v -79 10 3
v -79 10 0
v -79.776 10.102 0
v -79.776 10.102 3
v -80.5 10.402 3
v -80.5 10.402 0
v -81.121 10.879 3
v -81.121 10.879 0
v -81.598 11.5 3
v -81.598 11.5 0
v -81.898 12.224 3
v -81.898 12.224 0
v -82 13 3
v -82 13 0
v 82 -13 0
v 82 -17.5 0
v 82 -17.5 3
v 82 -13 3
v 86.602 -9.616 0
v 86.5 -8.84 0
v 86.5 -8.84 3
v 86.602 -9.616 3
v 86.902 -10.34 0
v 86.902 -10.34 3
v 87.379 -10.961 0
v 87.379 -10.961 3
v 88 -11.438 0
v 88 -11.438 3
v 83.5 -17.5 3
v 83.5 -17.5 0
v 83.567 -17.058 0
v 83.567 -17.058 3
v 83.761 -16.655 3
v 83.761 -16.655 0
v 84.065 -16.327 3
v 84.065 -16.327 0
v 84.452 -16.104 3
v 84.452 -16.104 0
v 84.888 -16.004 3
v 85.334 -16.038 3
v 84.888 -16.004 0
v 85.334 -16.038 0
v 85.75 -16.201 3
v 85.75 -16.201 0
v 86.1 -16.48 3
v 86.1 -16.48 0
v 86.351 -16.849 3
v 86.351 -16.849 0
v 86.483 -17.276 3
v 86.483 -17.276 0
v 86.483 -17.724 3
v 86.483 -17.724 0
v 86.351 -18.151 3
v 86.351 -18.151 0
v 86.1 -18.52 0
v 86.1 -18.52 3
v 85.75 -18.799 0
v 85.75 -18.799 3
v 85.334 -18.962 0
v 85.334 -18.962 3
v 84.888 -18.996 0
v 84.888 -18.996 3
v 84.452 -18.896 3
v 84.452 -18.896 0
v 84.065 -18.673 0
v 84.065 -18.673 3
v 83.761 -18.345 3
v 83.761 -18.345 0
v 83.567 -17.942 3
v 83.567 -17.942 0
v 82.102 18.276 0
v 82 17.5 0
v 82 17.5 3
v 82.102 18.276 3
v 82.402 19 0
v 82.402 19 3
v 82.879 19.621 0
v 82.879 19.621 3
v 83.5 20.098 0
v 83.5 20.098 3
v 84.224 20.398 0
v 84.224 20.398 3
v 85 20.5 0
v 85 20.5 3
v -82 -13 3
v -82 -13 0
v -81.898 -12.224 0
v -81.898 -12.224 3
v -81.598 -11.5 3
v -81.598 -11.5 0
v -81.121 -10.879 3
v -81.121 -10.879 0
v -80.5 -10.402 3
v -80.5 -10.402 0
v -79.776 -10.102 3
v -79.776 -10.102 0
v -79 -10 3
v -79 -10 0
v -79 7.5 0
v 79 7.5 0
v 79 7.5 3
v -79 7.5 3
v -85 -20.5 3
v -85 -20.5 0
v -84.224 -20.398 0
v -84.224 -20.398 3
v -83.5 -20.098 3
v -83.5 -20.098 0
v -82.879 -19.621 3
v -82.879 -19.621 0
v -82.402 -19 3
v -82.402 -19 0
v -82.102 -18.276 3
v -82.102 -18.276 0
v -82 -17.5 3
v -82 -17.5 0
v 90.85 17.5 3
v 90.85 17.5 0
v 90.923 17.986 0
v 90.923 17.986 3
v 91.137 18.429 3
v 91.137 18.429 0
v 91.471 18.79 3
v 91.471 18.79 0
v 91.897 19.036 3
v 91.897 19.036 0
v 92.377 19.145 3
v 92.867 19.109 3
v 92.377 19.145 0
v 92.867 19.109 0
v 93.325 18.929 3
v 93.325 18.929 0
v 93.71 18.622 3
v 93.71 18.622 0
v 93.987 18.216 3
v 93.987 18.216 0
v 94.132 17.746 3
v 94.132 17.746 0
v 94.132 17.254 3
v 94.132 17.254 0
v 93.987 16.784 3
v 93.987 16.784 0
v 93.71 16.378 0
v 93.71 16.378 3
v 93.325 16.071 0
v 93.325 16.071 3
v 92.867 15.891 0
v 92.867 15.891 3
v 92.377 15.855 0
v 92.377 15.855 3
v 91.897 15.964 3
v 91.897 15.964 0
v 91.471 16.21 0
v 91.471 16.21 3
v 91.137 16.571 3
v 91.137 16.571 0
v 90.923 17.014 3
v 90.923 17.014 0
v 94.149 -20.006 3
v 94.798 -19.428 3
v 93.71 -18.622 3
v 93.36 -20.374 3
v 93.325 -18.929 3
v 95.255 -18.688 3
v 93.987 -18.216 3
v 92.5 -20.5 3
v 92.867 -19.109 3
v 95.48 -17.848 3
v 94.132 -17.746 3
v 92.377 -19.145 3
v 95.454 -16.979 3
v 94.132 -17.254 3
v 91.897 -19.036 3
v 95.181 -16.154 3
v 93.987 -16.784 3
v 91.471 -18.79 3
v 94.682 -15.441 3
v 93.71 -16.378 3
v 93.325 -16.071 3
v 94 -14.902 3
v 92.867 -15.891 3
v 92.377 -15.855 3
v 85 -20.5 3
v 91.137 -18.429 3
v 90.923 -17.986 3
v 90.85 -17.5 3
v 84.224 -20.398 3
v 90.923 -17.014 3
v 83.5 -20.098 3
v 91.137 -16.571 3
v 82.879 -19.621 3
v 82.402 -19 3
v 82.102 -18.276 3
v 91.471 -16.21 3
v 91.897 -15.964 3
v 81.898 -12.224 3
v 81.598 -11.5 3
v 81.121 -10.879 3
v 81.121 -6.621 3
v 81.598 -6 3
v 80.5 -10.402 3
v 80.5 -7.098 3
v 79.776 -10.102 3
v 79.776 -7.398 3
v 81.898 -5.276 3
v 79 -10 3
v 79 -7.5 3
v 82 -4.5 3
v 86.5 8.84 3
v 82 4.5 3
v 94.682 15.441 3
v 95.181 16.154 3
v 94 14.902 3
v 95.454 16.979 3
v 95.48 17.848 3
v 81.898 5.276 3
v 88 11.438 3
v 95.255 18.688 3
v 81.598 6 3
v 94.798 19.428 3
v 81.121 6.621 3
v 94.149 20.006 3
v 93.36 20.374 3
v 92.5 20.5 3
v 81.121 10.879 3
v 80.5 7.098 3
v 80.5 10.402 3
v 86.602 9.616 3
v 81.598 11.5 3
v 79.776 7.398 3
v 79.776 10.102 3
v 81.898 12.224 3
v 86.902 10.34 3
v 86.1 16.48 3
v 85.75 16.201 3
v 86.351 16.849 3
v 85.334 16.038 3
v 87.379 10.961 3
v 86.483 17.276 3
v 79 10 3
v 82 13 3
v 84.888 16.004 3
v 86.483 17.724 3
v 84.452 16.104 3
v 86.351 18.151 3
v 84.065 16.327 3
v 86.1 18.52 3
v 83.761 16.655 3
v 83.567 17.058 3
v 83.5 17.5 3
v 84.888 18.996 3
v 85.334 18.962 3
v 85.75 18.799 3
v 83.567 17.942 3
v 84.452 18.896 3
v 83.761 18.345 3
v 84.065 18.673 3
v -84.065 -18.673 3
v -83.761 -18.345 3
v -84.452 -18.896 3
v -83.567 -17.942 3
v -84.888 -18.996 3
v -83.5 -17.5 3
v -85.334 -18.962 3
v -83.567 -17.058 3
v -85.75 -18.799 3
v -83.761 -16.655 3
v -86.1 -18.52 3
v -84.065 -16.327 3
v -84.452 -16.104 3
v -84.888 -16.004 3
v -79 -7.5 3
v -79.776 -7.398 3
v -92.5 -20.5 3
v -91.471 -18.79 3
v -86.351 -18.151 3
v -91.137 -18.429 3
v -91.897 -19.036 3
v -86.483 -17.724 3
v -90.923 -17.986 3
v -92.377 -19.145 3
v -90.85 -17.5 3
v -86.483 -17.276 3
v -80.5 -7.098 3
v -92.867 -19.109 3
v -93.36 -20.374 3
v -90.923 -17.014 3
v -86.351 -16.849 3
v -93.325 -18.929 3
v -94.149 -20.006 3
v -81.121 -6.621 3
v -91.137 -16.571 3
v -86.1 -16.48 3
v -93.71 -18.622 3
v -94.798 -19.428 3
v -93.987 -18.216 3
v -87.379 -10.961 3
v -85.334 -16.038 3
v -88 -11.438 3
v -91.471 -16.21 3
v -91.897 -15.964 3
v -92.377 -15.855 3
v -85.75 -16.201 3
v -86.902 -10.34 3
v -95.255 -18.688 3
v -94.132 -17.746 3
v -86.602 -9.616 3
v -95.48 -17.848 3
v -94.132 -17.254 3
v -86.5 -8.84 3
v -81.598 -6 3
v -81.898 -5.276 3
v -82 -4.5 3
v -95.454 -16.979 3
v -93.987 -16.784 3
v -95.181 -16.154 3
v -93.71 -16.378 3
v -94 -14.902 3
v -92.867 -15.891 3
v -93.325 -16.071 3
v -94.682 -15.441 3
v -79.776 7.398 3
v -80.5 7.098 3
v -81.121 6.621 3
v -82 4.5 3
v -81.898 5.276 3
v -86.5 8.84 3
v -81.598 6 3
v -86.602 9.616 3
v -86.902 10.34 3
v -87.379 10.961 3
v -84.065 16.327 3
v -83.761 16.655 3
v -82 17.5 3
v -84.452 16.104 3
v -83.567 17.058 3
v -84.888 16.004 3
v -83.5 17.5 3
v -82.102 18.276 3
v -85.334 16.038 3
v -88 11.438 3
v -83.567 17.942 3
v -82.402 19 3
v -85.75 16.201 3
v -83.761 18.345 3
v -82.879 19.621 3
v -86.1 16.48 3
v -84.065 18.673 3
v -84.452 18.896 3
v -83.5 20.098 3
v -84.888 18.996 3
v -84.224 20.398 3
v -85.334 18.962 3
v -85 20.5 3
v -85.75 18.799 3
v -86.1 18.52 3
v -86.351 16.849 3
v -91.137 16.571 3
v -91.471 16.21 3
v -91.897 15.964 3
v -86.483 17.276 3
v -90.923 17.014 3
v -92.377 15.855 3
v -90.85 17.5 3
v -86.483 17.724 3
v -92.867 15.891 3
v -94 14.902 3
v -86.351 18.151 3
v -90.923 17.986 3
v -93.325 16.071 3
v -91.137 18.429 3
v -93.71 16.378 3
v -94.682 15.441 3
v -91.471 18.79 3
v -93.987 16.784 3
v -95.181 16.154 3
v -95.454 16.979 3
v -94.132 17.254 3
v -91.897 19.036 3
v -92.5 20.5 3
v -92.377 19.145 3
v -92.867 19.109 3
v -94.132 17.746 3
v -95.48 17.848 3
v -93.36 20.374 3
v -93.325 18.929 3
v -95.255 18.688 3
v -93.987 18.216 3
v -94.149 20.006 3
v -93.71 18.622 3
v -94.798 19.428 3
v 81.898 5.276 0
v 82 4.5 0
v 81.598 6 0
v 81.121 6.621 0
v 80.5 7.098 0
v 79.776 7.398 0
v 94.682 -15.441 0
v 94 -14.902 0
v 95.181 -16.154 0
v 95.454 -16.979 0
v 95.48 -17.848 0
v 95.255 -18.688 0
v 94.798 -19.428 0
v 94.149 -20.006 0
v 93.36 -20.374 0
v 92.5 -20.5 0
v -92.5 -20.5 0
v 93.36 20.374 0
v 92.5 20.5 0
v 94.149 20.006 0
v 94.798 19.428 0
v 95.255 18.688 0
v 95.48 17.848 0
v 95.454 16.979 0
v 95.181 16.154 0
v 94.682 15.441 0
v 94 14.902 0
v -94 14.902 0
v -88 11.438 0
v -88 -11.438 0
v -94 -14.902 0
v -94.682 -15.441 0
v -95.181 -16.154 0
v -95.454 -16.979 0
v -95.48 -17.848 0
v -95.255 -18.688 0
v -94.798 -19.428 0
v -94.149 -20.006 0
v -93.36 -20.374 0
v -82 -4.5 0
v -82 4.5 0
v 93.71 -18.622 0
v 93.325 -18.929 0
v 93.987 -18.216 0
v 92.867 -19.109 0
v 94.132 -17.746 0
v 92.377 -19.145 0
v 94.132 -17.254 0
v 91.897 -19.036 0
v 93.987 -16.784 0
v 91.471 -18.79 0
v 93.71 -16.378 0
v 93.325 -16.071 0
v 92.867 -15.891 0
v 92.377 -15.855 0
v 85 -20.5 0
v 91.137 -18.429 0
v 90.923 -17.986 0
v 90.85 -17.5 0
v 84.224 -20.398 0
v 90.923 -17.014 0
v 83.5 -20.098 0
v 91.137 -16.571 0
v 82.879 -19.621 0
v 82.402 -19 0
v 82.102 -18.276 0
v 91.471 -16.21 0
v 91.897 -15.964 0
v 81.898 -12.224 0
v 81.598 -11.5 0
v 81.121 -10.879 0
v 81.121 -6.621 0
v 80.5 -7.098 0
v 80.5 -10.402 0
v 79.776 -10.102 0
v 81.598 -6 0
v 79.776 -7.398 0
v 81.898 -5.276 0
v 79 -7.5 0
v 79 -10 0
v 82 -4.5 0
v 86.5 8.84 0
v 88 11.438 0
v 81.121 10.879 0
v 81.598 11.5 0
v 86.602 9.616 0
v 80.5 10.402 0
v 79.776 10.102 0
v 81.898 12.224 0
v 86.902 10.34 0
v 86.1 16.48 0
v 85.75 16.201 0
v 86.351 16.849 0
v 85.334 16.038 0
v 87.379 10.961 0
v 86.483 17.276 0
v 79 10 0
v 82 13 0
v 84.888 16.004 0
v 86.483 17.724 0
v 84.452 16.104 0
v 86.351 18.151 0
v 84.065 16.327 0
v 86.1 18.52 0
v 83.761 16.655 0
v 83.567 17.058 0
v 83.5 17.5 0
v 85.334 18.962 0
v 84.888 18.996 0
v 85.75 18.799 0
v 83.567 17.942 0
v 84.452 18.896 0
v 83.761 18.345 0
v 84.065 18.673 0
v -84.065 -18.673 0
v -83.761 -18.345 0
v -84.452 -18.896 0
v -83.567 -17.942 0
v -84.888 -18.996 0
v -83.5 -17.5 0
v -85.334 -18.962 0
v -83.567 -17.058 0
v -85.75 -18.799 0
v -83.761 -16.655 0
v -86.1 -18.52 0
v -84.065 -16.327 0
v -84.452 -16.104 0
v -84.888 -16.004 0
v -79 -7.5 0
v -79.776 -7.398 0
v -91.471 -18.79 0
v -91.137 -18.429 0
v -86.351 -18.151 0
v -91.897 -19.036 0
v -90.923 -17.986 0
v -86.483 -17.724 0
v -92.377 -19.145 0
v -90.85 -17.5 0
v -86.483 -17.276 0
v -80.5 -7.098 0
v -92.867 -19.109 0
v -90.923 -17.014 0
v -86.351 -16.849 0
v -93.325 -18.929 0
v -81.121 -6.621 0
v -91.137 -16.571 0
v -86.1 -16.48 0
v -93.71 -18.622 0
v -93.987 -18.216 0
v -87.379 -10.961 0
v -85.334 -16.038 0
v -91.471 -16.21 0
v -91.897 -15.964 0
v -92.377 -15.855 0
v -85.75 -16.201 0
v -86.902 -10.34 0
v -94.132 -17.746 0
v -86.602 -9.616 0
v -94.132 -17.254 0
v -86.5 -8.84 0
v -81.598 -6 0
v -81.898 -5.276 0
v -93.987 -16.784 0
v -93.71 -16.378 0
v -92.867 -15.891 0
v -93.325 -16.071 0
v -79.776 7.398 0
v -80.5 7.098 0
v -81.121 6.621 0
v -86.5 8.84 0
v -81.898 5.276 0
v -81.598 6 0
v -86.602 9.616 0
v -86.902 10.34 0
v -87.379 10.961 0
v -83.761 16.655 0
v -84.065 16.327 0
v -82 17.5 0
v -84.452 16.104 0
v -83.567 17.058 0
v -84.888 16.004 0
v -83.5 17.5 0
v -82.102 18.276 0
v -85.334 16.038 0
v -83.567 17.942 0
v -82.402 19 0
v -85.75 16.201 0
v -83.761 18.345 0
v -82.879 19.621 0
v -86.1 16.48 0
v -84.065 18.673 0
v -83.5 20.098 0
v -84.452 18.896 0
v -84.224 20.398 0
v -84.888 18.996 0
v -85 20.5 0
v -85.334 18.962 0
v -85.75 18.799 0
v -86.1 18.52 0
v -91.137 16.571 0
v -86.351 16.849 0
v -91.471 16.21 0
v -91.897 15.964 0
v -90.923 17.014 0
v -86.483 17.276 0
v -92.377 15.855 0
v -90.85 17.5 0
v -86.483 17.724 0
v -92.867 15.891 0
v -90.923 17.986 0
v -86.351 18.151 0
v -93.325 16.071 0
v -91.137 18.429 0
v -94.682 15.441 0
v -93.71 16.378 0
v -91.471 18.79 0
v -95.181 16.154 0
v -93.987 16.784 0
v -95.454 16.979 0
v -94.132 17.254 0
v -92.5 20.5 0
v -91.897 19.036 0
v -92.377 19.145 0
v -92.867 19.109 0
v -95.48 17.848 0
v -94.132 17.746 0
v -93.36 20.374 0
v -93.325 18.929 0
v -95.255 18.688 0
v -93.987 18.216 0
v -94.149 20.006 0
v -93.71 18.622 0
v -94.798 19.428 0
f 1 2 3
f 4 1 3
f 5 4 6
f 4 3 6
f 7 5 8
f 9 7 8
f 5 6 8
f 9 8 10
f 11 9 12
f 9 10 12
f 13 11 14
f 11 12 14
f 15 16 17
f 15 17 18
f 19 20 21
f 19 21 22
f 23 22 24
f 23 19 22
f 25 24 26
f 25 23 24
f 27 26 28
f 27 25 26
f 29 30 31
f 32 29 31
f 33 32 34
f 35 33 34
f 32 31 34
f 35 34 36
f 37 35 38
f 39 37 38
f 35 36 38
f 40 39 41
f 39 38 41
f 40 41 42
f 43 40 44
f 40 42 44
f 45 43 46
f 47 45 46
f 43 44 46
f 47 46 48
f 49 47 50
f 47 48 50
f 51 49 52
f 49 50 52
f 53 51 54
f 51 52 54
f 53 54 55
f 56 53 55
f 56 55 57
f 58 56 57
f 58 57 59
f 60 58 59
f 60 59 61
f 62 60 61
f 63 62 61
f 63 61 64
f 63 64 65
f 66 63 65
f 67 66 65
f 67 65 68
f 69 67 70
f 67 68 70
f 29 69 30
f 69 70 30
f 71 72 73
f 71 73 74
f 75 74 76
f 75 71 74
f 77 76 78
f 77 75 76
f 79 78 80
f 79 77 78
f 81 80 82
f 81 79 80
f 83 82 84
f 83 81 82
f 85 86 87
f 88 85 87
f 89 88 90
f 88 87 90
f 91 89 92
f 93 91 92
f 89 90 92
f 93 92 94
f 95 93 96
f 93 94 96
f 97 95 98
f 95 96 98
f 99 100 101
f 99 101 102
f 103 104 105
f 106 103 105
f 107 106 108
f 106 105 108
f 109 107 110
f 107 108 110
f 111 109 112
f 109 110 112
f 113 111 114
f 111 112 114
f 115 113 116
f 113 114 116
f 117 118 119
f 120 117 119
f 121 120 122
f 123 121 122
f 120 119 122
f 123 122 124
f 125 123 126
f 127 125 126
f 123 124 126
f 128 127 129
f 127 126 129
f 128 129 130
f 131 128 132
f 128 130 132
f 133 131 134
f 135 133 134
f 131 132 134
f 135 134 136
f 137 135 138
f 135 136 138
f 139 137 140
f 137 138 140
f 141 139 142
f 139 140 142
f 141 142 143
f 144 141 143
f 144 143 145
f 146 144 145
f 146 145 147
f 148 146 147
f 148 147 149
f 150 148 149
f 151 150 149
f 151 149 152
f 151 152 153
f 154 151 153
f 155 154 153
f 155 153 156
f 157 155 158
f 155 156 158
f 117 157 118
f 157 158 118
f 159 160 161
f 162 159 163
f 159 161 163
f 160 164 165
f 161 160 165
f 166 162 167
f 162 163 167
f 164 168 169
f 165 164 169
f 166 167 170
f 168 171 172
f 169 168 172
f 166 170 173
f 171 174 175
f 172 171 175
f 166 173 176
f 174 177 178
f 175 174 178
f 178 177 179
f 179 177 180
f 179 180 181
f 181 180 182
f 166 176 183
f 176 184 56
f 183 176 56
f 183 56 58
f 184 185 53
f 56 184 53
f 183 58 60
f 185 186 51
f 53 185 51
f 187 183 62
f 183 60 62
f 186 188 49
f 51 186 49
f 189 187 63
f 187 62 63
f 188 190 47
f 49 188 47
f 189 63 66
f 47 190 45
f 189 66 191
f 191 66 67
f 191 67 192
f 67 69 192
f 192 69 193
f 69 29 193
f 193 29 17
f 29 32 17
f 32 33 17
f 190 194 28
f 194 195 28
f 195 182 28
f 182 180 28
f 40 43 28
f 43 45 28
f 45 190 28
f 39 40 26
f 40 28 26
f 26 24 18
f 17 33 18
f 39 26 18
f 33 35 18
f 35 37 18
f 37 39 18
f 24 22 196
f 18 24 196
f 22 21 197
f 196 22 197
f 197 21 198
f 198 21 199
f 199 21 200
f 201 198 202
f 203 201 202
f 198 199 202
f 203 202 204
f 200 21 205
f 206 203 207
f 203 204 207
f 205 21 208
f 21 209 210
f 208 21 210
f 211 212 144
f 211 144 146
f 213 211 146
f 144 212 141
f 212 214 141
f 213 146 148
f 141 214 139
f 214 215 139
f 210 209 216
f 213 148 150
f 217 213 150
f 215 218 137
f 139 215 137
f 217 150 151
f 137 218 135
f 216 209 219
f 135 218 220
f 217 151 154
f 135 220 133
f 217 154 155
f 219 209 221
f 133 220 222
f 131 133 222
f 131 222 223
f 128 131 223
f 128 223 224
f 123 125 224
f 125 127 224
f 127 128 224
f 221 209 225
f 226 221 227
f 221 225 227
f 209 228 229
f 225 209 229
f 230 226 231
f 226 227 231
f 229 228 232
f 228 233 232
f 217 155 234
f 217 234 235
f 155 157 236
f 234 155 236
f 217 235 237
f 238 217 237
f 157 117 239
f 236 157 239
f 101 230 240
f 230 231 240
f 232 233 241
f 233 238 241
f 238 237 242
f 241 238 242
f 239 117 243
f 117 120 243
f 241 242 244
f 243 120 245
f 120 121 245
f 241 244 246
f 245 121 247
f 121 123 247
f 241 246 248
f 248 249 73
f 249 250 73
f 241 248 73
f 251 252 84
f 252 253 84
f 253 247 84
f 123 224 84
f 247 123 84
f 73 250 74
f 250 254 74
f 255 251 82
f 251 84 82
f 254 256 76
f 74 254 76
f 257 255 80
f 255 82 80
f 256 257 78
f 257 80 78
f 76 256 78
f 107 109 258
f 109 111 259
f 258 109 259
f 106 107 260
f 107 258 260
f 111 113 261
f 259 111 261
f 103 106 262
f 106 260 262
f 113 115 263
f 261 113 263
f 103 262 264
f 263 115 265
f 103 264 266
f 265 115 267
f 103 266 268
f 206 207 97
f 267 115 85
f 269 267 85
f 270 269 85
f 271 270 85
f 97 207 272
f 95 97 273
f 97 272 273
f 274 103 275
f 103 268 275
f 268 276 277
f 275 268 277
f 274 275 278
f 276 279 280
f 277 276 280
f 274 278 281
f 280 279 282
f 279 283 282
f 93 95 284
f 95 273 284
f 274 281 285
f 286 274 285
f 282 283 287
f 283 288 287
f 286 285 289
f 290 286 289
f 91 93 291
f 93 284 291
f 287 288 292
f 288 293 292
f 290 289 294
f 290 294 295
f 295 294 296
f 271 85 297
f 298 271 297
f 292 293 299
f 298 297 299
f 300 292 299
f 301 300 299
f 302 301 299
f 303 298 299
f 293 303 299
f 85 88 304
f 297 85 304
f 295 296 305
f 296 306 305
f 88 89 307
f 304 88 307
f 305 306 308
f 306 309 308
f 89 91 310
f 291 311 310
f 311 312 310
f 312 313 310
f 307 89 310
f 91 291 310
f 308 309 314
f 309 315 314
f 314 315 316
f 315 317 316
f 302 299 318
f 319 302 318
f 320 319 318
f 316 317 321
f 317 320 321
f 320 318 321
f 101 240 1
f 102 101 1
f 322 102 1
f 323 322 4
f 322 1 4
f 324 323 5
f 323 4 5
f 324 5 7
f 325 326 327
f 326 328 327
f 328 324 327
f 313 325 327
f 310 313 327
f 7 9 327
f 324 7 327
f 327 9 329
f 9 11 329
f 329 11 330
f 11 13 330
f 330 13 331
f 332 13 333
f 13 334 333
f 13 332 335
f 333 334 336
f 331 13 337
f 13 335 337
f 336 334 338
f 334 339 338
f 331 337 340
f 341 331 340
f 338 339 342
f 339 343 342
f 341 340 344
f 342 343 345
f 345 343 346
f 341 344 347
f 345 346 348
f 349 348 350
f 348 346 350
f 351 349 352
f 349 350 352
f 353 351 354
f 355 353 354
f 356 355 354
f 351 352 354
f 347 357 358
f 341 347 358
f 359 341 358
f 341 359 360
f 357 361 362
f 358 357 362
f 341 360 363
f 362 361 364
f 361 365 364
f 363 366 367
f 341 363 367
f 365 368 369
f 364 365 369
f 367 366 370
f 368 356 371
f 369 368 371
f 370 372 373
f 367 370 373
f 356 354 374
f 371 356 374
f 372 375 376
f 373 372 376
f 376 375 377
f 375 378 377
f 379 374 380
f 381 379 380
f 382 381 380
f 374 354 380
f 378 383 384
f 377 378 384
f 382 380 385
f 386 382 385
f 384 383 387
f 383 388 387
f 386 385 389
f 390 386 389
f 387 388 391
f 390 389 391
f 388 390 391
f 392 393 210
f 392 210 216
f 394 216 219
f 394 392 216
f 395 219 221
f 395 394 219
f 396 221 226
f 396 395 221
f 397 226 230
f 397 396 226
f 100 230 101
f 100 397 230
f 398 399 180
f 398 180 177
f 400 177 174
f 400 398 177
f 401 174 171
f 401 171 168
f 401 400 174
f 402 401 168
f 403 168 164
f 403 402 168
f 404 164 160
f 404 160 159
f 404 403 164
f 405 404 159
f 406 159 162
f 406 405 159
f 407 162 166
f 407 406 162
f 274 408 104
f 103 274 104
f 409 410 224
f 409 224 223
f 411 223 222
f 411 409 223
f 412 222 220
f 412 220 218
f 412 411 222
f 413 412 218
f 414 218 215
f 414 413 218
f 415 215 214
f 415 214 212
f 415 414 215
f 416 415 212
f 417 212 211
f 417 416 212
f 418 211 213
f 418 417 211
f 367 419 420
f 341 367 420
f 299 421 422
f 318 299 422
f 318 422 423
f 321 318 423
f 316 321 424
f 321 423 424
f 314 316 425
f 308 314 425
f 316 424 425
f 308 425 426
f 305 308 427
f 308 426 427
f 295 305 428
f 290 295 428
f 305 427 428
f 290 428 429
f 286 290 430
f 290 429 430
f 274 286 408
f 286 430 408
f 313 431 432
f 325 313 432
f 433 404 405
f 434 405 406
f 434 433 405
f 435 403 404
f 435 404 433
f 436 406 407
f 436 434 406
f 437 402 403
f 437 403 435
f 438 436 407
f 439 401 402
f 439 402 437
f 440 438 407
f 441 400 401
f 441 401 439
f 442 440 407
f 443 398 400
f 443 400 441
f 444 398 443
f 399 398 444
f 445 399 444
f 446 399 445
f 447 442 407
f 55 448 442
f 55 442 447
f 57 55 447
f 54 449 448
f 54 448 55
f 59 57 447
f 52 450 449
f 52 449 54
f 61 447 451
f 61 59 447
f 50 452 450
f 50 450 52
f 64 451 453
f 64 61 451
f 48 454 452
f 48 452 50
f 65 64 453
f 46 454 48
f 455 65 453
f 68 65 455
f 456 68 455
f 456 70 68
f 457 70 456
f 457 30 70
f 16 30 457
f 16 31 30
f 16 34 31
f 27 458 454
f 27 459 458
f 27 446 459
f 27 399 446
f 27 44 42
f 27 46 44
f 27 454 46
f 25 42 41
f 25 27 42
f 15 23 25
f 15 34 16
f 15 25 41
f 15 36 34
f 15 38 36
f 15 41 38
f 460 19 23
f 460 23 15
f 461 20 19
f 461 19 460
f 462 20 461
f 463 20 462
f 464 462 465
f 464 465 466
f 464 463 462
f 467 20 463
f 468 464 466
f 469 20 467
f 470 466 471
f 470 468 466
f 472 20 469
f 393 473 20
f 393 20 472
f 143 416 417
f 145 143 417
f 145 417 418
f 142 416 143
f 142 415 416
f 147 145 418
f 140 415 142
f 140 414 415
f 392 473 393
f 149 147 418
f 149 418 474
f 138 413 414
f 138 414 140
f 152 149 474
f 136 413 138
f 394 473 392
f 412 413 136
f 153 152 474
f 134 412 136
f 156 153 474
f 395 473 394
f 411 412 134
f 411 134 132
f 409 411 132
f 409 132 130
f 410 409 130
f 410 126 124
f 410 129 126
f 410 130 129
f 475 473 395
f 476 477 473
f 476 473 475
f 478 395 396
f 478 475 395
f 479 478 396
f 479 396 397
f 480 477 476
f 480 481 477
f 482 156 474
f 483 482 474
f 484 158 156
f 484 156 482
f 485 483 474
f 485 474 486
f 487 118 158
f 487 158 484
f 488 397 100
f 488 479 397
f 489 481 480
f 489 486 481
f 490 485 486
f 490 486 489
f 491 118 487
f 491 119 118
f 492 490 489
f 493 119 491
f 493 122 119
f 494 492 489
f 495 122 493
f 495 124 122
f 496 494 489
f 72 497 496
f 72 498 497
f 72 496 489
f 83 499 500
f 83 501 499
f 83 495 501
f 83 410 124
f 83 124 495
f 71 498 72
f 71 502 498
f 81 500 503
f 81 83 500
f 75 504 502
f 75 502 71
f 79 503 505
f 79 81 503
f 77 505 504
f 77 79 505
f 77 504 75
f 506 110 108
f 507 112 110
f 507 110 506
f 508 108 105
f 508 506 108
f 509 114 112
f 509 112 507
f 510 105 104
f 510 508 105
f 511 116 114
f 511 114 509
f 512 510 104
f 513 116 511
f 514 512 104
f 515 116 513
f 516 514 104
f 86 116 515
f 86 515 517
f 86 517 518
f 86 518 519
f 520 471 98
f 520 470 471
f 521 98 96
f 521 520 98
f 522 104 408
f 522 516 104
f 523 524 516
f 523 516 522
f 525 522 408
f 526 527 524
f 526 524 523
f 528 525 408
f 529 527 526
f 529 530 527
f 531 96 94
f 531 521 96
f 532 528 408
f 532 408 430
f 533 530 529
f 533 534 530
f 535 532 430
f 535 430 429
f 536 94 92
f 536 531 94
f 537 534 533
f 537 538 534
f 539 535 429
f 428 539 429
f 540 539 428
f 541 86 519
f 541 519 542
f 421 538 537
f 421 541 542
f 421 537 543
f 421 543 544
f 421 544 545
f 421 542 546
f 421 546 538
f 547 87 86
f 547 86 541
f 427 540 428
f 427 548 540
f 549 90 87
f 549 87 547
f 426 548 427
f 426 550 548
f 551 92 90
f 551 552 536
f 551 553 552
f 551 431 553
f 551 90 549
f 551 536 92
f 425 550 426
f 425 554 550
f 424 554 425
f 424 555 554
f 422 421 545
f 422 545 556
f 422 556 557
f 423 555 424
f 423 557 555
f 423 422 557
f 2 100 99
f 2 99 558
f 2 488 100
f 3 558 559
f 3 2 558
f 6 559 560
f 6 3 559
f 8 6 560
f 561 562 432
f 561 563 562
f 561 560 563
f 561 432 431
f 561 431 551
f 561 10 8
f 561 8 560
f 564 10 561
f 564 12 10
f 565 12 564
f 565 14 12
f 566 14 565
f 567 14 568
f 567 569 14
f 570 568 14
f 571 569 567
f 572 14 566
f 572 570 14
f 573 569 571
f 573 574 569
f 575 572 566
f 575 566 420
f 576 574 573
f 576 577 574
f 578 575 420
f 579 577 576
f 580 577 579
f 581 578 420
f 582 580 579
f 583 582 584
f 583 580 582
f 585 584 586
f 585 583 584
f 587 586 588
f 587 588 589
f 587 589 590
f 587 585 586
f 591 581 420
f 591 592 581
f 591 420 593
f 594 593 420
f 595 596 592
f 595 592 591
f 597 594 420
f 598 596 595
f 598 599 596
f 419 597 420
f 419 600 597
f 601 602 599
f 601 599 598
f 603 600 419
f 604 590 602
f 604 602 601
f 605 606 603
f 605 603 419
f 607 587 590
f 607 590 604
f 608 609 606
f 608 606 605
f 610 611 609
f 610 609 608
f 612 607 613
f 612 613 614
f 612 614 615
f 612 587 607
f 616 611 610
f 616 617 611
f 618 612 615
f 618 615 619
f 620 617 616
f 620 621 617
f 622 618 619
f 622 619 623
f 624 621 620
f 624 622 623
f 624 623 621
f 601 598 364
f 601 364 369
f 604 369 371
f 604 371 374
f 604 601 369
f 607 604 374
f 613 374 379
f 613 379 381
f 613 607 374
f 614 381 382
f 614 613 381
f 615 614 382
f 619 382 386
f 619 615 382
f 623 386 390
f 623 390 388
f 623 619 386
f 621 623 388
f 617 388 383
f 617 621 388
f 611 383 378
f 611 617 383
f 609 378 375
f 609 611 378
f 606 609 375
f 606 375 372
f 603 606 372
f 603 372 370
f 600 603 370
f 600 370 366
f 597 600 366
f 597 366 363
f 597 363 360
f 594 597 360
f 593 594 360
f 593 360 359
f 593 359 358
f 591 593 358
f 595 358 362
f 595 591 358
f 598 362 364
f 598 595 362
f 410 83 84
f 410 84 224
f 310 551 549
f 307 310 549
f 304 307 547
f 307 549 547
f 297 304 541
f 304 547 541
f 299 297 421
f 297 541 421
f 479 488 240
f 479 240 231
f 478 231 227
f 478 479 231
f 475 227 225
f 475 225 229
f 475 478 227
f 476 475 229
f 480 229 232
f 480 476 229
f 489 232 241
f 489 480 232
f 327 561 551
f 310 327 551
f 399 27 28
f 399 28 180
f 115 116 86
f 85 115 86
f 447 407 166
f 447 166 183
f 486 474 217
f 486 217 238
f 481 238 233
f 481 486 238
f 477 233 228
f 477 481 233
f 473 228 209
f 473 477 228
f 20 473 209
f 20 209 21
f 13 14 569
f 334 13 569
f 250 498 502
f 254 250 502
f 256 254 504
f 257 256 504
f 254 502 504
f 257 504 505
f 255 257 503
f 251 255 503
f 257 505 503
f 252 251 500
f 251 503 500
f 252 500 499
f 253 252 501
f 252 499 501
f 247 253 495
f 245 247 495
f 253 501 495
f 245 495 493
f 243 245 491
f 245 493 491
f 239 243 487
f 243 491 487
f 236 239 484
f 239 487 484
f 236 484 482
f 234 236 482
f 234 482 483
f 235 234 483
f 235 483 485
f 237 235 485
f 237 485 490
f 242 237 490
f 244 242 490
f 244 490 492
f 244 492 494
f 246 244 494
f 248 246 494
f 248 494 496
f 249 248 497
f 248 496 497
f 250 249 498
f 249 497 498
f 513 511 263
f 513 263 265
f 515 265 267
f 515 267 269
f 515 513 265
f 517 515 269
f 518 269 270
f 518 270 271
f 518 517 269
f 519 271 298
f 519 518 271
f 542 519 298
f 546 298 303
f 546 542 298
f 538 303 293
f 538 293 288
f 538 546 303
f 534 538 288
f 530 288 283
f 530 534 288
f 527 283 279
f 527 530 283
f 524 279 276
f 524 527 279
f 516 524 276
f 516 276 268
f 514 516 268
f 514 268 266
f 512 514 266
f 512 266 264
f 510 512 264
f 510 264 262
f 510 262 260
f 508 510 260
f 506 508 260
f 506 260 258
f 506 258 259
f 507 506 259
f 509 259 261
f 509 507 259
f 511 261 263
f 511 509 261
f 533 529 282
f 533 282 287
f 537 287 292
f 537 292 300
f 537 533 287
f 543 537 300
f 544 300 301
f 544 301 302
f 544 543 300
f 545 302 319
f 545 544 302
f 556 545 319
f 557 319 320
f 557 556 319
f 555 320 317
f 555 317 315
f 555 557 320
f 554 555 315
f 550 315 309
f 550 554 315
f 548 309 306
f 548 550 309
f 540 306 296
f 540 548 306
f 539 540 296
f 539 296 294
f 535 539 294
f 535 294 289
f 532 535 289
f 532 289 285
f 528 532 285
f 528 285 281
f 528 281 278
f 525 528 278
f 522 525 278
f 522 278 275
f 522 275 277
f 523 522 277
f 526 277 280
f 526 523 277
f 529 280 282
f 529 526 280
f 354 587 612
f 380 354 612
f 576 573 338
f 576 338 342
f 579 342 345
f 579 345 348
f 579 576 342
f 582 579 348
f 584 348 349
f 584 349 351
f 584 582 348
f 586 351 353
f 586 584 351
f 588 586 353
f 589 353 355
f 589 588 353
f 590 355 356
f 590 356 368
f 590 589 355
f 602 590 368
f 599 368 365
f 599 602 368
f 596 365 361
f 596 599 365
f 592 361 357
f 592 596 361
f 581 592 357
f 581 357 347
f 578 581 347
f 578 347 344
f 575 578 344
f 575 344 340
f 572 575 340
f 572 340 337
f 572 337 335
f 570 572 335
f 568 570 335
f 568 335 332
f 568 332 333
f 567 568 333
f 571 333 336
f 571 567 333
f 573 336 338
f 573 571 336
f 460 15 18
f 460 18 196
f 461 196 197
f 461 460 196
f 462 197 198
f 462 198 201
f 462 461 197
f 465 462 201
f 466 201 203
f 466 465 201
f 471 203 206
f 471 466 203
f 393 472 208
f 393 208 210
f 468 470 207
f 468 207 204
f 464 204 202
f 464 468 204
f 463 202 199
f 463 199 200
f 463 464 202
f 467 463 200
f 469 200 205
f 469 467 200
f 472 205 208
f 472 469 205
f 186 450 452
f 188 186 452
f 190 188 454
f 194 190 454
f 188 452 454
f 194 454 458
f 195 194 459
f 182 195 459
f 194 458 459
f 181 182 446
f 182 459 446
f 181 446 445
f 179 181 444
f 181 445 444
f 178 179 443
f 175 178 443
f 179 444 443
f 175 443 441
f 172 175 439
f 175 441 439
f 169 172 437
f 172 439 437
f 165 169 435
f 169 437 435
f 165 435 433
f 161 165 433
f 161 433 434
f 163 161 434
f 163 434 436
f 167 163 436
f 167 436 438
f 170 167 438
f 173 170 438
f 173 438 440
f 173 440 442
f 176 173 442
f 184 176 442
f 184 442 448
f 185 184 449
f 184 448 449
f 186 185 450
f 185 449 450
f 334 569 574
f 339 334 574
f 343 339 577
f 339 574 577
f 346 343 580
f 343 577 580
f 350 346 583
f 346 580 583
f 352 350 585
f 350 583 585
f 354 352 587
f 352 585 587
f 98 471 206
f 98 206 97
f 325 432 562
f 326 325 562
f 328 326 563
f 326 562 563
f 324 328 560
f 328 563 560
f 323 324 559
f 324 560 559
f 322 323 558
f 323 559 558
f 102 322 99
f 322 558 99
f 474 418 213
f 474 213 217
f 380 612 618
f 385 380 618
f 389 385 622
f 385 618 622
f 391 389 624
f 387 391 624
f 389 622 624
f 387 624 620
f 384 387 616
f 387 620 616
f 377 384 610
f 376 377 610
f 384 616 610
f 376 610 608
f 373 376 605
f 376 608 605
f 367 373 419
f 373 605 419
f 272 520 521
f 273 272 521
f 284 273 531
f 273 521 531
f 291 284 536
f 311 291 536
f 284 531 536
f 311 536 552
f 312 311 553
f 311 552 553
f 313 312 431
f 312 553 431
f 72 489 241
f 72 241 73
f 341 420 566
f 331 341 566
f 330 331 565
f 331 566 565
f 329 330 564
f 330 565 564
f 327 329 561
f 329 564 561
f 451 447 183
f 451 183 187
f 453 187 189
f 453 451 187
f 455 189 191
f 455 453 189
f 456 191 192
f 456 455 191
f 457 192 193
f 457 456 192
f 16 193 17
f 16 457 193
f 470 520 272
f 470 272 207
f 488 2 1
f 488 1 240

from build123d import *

# Parameters (mm, degrees)
ESBO_O1_R                = 1.65
ESBO_O1_R_2              = 1.5
RESSALTO_EXTRUS_O1_DEPTH = 3


with BuildPart() as part:
    # Esboço1 → Ressalto-extrusão1 (new body)
    with BuildSketch(Plane.XY):
        with BuildLine():
            Line((-92.5, -20.5), (-85, -20.5))
            ThreePointArc((-85, -20.5), (-82.878679656, -19.621320344), (-82, -17.5))
            Line((-82, -17.5), (-82, -13))
            ThreePointArc((-82, -13), (-81.121320344, -10.878679656), (-79, -10))
            Line((-79, -10), (0, -10))
            Line((0, -10), (0, -7.5))
            Line((0, -7.5), (-79, -7.5))
            ThreePointArc((-79, -7.5), (-81.121320344, -6.621320344), (-82, -4.5))
            Line((-82, -4.5), (-82, 4.5))
            ThreePointArc((-82, 4.5), (-81.121320344, 6.621320344), (-79, 7.5))
            Line((-79, 7.5), (0, 7.5))
            Line((0, 7.5), (0, 10))
            Line((0, 10), (-79, 10))
            ThreePointArc((-79, 10), (-81.121320344, 10.878679656), (-82, 13))
            Line((-82, 13), (-82, 17.5))
            ThreePointArc((-82, 17.5), (-82.878679656, 19.621320344), (-85, 20.5))
            Line((-85, 20.5), (-92.5, 20.5))
            ThreePointArc((-92.5, 20.5), (-95.397777479, 18.276457135), (-94, 14.901923789))
            Line((-94, 14.901923789), (-88, 11.437822174))
            ThreePointArc((-88, 11.437822174), (-86.901923789, 10.339745962), (-86.5, 8.839745962))
            Line((-86.5, 8.839745962), (-86.5, -8.839745962))
            ThreePointArc((-86.5, -8.839745962), (-86.901923789, -10.339745962), (-88, -11.437822174))
            Line((-88, -11.437822174), (-94, -14.901923789))
            ThreePointArc((-94, -14.901923789), (-95.397777479, -18.276457135), (-92.5, -20.5))
        make_face()
        with Locations((-92.5, 17.5)):
            Circle(ESBO_O1_R, mode=Mode.SUBTRACT)
        with Locations((-92.5, -17.5)):
            Circle(ESBO_O1_R, mode=Mode.SUBTRACT)
        with Locations((-85, 17.5)):
            Circle(ESBO_O1_R_2, mode=Mode.SUBTRACT)
        with Locations((-85, -17.5)):
            Circle(ESBO_O1_R_2, mode=Mode.SUBTRACT)
    ressalto_extrus_o1 = extrude(amount=RESSALTO_EXTRUS_O1_DEPTH)

    # Espelhar1: Ressalto-extrusão1 across plane
    add(ressalto_extrus_o1.mirror(Plane(origin=(0, 0, 0), x_dir=(0, 0, 1), z_dir=(1, 0, 0))))


solid = part.part
